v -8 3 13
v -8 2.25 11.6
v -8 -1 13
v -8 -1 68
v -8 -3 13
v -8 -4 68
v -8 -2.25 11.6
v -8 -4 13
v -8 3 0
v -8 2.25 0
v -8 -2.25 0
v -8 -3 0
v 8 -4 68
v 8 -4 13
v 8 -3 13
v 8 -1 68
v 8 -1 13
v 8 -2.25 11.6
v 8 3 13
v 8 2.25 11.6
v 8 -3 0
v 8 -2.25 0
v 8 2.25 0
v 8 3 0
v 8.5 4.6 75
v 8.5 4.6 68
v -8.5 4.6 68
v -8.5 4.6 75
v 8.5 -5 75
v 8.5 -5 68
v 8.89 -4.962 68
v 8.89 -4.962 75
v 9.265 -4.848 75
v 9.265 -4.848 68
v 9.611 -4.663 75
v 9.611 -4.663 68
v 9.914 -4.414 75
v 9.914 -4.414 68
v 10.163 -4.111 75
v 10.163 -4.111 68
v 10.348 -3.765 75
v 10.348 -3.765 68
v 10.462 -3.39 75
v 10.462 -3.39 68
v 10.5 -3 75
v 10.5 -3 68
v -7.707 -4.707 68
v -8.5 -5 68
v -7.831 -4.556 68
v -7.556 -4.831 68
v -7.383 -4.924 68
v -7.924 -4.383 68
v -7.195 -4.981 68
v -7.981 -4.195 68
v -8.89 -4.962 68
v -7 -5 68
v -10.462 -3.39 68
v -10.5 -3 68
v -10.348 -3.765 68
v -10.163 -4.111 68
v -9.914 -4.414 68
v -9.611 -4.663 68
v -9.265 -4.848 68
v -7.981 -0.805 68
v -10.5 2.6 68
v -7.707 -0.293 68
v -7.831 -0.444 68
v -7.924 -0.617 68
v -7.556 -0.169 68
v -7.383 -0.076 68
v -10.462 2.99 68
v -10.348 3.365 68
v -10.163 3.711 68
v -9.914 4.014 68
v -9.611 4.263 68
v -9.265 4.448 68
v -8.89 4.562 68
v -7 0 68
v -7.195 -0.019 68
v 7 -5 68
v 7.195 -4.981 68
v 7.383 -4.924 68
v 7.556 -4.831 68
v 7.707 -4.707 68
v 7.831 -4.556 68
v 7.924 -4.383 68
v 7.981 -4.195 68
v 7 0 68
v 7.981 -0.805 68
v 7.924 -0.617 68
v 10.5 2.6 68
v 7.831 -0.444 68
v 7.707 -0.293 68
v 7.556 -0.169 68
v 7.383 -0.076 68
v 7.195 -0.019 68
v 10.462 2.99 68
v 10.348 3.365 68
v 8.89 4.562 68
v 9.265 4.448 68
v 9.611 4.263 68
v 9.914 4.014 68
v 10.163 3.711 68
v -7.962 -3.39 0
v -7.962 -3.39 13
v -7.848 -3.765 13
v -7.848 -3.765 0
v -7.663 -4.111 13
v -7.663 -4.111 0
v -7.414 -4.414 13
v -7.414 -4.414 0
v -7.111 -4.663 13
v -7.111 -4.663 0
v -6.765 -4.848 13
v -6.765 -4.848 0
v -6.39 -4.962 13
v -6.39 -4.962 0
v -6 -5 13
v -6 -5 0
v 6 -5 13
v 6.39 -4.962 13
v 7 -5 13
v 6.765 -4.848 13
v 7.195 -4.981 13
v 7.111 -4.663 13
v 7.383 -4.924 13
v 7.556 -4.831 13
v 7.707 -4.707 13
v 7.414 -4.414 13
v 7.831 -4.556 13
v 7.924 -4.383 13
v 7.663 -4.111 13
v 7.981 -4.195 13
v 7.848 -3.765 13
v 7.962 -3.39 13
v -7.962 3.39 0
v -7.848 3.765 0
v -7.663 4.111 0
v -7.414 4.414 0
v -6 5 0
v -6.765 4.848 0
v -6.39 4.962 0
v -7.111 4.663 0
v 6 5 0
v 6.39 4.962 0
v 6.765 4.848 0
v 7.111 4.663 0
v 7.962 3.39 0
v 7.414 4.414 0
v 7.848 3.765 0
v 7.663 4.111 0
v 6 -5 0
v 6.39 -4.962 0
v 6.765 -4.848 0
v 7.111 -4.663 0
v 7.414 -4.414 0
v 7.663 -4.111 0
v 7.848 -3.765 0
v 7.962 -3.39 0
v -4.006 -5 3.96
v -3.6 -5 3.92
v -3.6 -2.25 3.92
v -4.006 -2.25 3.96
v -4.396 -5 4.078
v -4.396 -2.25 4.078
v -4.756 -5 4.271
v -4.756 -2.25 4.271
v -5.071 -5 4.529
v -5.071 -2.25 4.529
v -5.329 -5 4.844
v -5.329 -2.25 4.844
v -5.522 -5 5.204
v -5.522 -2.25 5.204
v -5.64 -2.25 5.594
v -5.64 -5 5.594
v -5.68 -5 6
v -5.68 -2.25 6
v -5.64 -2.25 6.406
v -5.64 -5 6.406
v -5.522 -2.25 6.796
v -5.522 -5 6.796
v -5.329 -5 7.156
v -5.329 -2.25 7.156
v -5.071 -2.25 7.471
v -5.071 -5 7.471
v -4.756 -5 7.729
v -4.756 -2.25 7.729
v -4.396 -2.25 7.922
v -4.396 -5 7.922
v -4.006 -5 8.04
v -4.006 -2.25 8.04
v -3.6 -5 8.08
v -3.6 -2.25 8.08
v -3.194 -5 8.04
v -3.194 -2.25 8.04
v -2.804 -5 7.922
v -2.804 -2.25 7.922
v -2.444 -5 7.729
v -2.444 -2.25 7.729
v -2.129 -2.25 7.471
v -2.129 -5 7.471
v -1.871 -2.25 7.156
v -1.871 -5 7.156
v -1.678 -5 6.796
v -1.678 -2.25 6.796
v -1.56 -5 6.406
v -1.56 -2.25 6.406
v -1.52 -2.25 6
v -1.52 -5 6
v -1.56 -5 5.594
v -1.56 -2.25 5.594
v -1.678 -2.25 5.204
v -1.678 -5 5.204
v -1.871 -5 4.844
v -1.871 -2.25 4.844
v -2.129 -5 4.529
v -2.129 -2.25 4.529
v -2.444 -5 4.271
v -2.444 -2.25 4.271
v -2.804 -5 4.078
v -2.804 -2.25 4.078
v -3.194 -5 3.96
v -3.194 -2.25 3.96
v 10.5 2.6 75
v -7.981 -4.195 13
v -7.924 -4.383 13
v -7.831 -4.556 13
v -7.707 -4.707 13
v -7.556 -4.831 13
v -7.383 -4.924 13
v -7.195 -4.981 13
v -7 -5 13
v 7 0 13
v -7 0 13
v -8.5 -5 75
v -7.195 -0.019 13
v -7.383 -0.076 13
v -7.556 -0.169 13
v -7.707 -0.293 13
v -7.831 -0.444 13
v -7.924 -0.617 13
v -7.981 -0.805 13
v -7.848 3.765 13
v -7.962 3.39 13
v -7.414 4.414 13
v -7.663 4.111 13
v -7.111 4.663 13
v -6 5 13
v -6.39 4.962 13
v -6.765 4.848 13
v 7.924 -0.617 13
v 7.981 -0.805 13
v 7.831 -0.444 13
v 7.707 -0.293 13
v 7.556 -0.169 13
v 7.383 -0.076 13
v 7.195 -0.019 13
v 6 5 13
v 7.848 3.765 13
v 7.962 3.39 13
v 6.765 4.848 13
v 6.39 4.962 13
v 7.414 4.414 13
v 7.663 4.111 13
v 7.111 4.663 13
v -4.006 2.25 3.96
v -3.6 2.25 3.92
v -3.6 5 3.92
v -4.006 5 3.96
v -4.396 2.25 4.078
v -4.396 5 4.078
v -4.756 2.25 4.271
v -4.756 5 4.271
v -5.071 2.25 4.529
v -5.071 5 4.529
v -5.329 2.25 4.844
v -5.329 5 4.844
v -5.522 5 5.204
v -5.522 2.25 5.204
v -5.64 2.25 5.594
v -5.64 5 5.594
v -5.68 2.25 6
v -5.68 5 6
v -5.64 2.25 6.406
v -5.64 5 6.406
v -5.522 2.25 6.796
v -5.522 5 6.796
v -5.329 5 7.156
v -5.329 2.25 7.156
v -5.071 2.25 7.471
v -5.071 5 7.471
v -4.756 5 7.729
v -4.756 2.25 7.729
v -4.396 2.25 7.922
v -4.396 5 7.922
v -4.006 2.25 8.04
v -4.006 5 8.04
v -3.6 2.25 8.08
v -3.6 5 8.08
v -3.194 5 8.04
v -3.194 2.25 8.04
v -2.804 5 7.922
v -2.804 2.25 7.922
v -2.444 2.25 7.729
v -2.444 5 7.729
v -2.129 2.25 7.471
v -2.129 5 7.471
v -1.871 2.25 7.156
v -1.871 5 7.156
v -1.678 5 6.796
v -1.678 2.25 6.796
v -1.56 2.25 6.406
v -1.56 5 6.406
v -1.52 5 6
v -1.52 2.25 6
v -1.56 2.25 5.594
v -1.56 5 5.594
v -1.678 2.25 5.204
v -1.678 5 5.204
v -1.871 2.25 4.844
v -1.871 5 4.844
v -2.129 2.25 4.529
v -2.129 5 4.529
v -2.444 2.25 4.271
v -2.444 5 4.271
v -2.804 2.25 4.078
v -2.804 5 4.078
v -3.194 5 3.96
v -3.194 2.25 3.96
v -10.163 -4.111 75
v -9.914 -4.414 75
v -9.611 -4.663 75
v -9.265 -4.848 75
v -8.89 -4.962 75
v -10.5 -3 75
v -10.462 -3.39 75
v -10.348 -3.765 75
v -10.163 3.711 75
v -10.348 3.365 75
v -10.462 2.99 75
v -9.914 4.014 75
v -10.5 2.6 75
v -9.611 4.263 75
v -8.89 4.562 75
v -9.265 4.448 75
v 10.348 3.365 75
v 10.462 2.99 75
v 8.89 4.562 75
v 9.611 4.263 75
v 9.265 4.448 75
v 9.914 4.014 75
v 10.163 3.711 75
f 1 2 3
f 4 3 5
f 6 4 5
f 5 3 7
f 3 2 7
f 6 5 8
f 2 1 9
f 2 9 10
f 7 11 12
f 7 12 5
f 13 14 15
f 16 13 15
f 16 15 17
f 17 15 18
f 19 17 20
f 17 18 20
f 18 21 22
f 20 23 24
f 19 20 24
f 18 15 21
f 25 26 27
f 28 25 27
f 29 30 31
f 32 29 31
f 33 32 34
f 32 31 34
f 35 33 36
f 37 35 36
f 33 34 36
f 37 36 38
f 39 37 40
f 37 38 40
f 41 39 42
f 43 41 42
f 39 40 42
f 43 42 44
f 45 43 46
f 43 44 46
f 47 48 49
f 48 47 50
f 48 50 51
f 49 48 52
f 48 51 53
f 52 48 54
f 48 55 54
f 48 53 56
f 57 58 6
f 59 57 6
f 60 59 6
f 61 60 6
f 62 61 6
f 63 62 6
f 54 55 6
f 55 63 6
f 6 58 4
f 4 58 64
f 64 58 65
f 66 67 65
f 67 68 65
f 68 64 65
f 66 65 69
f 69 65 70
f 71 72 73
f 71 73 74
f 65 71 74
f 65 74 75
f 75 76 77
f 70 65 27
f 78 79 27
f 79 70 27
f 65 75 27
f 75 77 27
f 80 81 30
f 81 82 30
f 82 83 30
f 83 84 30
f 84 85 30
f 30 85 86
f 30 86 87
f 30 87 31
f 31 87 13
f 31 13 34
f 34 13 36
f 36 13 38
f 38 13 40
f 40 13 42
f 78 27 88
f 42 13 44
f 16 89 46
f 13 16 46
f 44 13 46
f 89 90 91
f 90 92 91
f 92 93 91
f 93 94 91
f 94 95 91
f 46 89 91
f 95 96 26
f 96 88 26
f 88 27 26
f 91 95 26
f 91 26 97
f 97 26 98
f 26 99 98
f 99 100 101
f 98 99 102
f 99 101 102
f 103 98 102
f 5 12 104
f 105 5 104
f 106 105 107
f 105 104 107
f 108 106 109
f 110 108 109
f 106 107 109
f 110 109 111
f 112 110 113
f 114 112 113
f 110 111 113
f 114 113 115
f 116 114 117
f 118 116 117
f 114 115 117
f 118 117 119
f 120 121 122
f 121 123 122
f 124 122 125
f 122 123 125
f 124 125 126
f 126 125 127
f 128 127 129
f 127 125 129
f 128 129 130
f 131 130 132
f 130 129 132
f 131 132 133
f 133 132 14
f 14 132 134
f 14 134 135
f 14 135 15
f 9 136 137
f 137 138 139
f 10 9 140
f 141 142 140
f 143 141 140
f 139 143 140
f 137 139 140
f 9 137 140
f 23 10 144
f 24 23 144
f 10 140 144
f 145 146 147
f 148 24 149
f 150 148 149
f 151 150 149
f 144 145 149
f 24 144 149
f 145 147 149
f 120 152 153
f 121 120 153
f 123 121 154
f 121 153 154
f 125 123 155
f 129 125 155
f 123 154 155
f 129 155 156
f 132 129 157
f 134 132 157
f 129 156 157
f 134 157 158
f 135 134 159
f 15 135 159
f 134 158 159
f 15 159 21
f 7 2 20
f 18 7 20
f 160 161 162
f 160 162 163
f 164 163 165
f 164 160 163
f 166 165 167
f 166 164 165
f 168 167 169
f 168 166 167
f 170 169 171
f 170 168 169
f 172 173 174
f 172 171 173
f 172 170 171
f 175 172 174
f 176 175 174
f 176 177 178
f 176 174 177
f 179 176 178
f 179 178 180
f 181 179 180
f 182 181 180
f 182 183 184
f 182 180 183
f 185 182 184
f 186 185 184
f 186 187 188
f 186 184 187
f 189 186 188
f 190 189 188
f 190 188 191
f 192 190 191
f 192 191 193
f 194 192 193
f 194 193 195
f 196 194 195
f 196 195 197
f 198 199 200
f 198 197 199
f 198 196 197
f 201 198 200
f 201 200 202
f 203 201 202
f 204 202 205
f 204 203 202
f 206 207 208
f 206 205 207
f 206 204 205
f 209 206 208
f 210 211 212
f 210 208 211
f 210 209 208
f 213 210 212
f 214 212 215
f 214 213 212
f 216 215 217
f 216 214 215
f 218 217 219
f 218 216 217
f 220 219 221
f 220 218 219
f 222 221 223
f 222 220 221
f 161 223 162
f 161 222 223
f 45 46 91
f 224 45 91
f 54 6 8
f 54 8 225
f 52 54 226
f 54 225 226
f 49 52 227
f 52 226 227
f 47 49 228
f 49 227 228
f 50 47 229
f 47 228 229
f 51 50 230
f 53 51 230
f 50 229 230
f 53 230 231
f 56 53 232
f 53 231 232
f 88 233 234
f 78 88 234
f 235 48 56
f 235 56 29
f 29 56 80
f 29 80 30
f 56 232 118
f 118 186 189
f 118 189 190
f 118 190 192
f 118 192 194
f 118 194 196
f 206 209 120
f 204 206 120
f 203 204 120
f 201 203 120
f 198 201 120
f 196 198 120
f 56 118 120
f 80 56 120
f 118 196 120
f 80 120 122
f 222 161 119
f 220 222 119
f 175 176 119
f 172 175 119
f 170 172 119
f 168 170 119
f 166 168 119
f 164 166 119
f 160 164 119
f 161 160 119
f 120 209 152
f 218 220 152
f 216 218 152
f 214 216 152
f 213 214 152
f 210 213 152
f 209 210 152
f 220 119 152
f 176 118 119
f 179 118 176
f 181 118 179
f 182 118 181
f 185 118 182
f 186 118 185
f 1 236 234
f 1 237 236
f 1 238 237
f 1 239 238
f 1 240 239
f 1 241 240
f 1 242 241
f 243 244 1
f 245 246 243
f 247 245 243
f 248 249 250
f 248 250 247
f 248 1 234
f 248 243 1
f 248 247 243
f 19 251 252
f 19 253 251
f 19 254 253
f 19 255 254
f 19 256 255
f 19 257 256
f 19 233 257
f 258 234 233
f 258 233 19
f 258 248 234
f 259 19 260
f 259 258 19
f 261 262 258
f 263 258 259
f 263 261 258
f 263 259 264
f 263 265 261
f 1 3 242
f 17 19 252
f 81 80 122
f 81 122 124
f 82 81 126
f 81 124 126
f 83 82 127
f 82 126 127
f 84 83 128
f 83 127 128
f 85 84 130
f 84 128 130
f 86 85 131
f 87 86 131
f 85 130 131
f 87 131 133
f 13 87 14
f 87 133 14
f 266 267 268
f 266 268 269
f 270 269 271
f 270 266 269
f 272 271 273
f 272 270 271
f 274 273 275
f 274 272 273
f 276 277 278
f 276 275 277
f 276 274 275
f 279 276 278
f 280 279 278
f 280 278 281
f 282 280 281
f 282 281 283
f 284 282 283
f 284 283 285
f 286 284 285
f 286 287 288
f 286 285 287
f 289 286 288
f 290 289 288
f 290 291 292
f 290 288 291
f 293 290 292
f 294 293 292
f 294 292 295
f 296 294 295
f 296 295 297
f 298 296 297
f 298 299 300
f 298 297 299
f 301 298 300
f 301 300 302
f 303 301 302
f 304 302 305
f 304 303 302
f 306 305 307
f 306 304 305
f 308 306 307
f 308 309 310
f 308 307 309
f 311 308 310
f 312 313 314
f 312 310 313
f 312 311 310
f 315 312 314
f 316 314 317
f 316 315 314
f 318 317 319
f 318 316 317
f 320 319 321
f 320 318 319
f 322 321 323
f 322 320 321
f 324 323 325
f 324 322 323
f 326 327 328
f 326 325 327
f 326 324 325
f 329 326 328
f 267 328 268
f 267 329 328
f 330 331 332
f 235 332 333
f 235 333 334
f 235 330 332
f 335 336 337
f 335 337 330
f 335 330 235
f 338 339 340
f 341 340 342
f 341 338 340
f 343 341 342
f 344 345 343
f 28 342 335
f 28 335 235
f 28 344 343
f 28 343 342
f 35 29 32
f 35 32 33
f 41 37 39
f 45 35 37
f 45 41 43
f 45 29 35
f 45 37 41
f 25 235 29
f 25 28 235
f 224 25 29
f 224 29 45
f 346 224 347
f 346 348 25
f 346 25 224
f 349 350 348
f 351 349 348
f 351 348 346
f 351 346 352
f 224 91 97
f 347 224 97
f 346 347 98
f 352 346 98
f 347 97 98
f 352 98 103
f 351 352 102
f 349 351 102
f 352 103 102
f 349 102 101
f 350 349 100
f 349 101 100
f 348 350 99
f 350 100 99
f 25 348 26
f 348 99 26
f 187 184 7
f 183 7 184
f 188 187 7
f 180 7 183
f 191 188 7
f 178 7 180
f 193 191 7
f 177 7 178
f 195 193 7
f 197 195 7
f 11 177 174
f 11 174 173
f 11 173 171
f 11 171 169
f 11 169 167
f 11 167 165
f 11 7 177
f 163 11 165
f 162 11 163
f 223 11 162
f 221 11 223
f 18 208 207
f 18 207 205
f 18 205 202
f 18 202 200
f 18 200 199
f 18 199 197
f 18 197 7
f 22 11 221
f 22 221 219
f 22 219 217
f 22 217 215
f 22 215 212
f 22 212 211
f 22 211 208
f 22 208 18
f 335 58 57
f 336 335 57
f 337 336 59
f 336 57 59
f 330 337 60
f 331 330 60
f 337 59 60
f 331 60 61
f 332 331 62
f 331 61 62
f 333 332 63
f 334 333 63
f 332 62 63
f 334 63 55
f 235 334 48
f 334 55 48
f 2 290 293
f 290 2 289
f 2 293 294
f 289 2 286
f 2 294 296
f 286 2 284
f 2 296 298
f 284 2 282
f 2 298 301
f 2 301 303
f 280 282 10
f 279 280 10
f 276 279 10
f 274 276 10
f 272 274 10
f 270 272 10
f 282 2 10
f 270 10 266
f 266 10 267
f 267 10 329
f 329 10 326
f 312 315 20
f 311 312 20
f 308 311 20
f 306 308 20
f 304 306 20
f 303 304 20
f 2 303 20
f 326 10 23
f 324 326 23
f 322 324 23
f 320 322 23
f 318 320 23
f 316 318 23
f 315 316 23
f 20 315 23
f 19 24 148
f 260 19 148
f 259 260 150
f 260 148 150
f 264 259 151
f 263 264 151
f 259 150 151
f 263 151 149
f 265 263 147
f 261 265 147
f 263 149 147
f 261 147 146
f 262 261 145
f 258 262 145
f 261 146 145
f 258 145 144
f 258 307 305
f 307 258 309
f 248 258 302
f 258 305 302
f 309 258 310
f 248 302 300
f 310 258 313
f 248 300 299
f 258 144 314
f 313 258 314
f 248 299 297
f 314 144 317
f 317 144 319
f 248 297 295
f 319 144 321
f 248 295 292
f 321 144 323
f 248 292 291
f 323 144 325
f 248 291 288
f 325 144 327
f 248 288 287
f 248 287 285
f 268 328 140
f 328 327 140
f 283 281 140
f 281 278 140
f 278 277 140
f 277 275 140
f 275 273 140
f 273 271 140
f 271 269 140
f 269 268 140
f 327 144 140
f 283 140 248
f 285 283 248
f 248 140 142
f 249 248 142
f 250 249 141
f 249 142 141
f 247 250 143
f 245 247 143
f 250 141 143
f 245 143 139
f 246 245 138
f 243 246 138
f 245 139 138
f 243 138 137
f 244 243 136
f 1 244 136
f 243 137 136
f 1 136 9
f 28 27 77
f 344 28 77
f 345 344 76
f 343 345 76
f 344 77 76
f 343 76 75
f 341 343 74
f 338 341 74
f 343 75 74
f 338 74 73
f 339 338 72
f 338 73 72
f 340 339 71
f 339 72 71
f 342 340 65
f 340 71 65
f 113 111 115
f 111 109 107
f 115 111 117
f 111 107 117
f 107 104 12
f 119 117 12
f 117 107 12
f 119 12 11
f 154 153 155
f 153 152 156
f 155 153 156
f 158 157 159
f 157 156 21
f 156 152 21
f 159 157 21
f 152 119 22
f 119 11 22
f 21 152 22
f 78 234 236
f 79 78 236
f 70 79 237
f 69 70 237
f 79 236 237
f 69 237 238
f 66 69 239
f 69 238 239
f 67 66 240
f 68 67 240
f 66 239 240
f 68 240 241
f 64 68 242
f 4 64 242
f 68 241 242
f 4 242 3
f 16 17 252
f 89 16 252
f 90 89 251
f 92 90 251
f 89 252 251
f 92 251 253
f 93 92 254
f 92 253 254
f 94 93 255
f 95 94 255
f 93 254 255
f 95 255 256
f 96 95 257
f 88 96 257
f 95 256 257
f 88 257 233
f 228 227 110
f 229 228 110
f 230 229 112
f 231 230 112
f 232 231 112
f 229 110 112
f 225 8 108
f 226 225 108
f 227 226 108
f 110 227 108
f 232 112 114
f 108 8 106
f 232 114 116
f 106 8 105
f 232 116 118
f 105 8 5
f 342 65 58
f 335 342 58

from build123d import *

# Parameters (mm, degrees)
F_01_START                                = 13
F_01_TPU_16_BY_5_GAUGE_DEPTH              = 55
F_02_CORD_END_BLOCK_DEPTH                 = 13
F_03_START                                = 68
F_03_CAPTURED_TAIL_BUTTON_DEPTH           = 7
F_04_START                                = -0.2
S04_OPEN_TWO_EAR_PIN_CLEVIS_W             = 18
S04_OPEN_TWO_EAR_PIN_CLEVIS_H             = 4.5
F_04_OPEN_TWO_EAR_PIN_CLEVIS_DEPTH        = 11.8
F_05_START                                = -5.2
S05_SHOULDER_PIN_THROUGH_BOTH_EARS_R      = 2.08
F_05_SHOULDER_PIN_THROUGH_BOTH_EARS_DEPTH = 10.4


with BuildPart() as part:
    # S01 - TPU 16 by 5 gauge → 01 - TPU 16 by 5 gauge (new body)
    with BuildSketch(Plane.XY.offset(F_01_START)):
        with BuildLine():
            Line((-7, -5), (7, -5))
            ThreePointArc((7, -5), (7.707106781, -4.707106781), (8, -4))
            Line((8, -4), (8, -1))
            ThreePointArc((8, -1), (7.707106781, -0.292893219), (7, 0))
            Line((7, 0), (-7, 0))
            ThreePointArc((-7, 0), (-7.707106781, -0.292893219), (-8, -1))
            Line((-8, -1), (-8, -4))
            ThreePointArc((-8, -4), (-7.707106781, -4.707106781), (-7, -5))
        make_face()
    extrude(amount=F_01_TPU_16_BY_5_GAUGE_DEPTH)

    # S02 - Cord end block → 02 - Cord end block (add)
    with BuildSketch(Plane.XY):
        with BuildLine():
            Line((-6, -5), (6, -5))
            ThreePointArc((6, -5), (7.414213562, -4.414213562), (8, -3))
            Line((8, -3), (8, 3))
            ThreePointArc((8, 3), (7.414213562, 4.414213562), (6, 5))
            Line((6, 5), (-6, 5))
            ThreePointArc((-6, 5), (-7.414213562, 4.414213562), (-8, 3))
            Line((-8, 3), (-8, -3))
            ThreePointArc((-8, -3), (-7.414213562, -4.414213562), (-6, -5))
        make_face()
    extrude(amount=F_02_CORD_END_BLOCK_DEPTH)

    # S03 - Captured tail button → 03 - Captured tail button (add)
    with BuildSketch(Plane.XY.offset(F_03_START)):
        with BuildLine():
            Line((-8.5, -5), (8.5, -5))
            ThreePointArc((8.5, -5), (9.914213562, -4.414213562), (10.5, -3))
            Line((10.5, -3), (10.5, 2.6))
            ThreePointArc((10.5, 2.6), (9.914213562, 4.014213562), (8.5, 4.6))
            Line((8.5, 4.6), (-8.5, 4.6))
            ThreePointArc((-8.5, 4.6), (-9.914213562, 4.014213562), (-10.5, 2.6))
            Line((-10.5, 2.6), (-10.5, -3))
            ThreePointArc((-10.5, -3), (-9.914213562, -4.414213562), (-8.5, -5))
        make_face()
    extrude(amount=F_03_CAPTURED_TAIL_BUTTON_DEPTH)

    # S04 - Open two-ear pin clevis → 04 - Open two-ear pin clevis (cut)
    with BuildSketch(Plane.XY.offset(F_04_START)):
        Rectangle(S04_OPEN_TWO_EAR_PIN_CLEVIS_W, S04_OPEN_TWO_EAR_PIN_CLEVIS_H)
    extrude(amount=F_04_OPEN_TWO_EAR_PIN_CLEVIS_DEPTH, mode=Mode.SUBTRACT)

    # S05 - Shoulder pin through both ears → 05 - Shoulder pin through both ears (cut)
    with BuildSketch(Plane(origin=(0, 0, 0), x_dir=(1, 0, 0), z_dir=(0, 1, 0)).offset(F_05_START)):
        with Locations(Location((-3.6, -6, 0), (0, 0, 90))):
            Circle(S05_SHOULDER_PIN_THROUGH_BOTH_EARS_R)
    extrude(amount=F_05_SHOULDER_PIN_THROUGH_BOTH_EARS_DEPTH, mode=Mode.SUBTRACT)


solid = part.part
